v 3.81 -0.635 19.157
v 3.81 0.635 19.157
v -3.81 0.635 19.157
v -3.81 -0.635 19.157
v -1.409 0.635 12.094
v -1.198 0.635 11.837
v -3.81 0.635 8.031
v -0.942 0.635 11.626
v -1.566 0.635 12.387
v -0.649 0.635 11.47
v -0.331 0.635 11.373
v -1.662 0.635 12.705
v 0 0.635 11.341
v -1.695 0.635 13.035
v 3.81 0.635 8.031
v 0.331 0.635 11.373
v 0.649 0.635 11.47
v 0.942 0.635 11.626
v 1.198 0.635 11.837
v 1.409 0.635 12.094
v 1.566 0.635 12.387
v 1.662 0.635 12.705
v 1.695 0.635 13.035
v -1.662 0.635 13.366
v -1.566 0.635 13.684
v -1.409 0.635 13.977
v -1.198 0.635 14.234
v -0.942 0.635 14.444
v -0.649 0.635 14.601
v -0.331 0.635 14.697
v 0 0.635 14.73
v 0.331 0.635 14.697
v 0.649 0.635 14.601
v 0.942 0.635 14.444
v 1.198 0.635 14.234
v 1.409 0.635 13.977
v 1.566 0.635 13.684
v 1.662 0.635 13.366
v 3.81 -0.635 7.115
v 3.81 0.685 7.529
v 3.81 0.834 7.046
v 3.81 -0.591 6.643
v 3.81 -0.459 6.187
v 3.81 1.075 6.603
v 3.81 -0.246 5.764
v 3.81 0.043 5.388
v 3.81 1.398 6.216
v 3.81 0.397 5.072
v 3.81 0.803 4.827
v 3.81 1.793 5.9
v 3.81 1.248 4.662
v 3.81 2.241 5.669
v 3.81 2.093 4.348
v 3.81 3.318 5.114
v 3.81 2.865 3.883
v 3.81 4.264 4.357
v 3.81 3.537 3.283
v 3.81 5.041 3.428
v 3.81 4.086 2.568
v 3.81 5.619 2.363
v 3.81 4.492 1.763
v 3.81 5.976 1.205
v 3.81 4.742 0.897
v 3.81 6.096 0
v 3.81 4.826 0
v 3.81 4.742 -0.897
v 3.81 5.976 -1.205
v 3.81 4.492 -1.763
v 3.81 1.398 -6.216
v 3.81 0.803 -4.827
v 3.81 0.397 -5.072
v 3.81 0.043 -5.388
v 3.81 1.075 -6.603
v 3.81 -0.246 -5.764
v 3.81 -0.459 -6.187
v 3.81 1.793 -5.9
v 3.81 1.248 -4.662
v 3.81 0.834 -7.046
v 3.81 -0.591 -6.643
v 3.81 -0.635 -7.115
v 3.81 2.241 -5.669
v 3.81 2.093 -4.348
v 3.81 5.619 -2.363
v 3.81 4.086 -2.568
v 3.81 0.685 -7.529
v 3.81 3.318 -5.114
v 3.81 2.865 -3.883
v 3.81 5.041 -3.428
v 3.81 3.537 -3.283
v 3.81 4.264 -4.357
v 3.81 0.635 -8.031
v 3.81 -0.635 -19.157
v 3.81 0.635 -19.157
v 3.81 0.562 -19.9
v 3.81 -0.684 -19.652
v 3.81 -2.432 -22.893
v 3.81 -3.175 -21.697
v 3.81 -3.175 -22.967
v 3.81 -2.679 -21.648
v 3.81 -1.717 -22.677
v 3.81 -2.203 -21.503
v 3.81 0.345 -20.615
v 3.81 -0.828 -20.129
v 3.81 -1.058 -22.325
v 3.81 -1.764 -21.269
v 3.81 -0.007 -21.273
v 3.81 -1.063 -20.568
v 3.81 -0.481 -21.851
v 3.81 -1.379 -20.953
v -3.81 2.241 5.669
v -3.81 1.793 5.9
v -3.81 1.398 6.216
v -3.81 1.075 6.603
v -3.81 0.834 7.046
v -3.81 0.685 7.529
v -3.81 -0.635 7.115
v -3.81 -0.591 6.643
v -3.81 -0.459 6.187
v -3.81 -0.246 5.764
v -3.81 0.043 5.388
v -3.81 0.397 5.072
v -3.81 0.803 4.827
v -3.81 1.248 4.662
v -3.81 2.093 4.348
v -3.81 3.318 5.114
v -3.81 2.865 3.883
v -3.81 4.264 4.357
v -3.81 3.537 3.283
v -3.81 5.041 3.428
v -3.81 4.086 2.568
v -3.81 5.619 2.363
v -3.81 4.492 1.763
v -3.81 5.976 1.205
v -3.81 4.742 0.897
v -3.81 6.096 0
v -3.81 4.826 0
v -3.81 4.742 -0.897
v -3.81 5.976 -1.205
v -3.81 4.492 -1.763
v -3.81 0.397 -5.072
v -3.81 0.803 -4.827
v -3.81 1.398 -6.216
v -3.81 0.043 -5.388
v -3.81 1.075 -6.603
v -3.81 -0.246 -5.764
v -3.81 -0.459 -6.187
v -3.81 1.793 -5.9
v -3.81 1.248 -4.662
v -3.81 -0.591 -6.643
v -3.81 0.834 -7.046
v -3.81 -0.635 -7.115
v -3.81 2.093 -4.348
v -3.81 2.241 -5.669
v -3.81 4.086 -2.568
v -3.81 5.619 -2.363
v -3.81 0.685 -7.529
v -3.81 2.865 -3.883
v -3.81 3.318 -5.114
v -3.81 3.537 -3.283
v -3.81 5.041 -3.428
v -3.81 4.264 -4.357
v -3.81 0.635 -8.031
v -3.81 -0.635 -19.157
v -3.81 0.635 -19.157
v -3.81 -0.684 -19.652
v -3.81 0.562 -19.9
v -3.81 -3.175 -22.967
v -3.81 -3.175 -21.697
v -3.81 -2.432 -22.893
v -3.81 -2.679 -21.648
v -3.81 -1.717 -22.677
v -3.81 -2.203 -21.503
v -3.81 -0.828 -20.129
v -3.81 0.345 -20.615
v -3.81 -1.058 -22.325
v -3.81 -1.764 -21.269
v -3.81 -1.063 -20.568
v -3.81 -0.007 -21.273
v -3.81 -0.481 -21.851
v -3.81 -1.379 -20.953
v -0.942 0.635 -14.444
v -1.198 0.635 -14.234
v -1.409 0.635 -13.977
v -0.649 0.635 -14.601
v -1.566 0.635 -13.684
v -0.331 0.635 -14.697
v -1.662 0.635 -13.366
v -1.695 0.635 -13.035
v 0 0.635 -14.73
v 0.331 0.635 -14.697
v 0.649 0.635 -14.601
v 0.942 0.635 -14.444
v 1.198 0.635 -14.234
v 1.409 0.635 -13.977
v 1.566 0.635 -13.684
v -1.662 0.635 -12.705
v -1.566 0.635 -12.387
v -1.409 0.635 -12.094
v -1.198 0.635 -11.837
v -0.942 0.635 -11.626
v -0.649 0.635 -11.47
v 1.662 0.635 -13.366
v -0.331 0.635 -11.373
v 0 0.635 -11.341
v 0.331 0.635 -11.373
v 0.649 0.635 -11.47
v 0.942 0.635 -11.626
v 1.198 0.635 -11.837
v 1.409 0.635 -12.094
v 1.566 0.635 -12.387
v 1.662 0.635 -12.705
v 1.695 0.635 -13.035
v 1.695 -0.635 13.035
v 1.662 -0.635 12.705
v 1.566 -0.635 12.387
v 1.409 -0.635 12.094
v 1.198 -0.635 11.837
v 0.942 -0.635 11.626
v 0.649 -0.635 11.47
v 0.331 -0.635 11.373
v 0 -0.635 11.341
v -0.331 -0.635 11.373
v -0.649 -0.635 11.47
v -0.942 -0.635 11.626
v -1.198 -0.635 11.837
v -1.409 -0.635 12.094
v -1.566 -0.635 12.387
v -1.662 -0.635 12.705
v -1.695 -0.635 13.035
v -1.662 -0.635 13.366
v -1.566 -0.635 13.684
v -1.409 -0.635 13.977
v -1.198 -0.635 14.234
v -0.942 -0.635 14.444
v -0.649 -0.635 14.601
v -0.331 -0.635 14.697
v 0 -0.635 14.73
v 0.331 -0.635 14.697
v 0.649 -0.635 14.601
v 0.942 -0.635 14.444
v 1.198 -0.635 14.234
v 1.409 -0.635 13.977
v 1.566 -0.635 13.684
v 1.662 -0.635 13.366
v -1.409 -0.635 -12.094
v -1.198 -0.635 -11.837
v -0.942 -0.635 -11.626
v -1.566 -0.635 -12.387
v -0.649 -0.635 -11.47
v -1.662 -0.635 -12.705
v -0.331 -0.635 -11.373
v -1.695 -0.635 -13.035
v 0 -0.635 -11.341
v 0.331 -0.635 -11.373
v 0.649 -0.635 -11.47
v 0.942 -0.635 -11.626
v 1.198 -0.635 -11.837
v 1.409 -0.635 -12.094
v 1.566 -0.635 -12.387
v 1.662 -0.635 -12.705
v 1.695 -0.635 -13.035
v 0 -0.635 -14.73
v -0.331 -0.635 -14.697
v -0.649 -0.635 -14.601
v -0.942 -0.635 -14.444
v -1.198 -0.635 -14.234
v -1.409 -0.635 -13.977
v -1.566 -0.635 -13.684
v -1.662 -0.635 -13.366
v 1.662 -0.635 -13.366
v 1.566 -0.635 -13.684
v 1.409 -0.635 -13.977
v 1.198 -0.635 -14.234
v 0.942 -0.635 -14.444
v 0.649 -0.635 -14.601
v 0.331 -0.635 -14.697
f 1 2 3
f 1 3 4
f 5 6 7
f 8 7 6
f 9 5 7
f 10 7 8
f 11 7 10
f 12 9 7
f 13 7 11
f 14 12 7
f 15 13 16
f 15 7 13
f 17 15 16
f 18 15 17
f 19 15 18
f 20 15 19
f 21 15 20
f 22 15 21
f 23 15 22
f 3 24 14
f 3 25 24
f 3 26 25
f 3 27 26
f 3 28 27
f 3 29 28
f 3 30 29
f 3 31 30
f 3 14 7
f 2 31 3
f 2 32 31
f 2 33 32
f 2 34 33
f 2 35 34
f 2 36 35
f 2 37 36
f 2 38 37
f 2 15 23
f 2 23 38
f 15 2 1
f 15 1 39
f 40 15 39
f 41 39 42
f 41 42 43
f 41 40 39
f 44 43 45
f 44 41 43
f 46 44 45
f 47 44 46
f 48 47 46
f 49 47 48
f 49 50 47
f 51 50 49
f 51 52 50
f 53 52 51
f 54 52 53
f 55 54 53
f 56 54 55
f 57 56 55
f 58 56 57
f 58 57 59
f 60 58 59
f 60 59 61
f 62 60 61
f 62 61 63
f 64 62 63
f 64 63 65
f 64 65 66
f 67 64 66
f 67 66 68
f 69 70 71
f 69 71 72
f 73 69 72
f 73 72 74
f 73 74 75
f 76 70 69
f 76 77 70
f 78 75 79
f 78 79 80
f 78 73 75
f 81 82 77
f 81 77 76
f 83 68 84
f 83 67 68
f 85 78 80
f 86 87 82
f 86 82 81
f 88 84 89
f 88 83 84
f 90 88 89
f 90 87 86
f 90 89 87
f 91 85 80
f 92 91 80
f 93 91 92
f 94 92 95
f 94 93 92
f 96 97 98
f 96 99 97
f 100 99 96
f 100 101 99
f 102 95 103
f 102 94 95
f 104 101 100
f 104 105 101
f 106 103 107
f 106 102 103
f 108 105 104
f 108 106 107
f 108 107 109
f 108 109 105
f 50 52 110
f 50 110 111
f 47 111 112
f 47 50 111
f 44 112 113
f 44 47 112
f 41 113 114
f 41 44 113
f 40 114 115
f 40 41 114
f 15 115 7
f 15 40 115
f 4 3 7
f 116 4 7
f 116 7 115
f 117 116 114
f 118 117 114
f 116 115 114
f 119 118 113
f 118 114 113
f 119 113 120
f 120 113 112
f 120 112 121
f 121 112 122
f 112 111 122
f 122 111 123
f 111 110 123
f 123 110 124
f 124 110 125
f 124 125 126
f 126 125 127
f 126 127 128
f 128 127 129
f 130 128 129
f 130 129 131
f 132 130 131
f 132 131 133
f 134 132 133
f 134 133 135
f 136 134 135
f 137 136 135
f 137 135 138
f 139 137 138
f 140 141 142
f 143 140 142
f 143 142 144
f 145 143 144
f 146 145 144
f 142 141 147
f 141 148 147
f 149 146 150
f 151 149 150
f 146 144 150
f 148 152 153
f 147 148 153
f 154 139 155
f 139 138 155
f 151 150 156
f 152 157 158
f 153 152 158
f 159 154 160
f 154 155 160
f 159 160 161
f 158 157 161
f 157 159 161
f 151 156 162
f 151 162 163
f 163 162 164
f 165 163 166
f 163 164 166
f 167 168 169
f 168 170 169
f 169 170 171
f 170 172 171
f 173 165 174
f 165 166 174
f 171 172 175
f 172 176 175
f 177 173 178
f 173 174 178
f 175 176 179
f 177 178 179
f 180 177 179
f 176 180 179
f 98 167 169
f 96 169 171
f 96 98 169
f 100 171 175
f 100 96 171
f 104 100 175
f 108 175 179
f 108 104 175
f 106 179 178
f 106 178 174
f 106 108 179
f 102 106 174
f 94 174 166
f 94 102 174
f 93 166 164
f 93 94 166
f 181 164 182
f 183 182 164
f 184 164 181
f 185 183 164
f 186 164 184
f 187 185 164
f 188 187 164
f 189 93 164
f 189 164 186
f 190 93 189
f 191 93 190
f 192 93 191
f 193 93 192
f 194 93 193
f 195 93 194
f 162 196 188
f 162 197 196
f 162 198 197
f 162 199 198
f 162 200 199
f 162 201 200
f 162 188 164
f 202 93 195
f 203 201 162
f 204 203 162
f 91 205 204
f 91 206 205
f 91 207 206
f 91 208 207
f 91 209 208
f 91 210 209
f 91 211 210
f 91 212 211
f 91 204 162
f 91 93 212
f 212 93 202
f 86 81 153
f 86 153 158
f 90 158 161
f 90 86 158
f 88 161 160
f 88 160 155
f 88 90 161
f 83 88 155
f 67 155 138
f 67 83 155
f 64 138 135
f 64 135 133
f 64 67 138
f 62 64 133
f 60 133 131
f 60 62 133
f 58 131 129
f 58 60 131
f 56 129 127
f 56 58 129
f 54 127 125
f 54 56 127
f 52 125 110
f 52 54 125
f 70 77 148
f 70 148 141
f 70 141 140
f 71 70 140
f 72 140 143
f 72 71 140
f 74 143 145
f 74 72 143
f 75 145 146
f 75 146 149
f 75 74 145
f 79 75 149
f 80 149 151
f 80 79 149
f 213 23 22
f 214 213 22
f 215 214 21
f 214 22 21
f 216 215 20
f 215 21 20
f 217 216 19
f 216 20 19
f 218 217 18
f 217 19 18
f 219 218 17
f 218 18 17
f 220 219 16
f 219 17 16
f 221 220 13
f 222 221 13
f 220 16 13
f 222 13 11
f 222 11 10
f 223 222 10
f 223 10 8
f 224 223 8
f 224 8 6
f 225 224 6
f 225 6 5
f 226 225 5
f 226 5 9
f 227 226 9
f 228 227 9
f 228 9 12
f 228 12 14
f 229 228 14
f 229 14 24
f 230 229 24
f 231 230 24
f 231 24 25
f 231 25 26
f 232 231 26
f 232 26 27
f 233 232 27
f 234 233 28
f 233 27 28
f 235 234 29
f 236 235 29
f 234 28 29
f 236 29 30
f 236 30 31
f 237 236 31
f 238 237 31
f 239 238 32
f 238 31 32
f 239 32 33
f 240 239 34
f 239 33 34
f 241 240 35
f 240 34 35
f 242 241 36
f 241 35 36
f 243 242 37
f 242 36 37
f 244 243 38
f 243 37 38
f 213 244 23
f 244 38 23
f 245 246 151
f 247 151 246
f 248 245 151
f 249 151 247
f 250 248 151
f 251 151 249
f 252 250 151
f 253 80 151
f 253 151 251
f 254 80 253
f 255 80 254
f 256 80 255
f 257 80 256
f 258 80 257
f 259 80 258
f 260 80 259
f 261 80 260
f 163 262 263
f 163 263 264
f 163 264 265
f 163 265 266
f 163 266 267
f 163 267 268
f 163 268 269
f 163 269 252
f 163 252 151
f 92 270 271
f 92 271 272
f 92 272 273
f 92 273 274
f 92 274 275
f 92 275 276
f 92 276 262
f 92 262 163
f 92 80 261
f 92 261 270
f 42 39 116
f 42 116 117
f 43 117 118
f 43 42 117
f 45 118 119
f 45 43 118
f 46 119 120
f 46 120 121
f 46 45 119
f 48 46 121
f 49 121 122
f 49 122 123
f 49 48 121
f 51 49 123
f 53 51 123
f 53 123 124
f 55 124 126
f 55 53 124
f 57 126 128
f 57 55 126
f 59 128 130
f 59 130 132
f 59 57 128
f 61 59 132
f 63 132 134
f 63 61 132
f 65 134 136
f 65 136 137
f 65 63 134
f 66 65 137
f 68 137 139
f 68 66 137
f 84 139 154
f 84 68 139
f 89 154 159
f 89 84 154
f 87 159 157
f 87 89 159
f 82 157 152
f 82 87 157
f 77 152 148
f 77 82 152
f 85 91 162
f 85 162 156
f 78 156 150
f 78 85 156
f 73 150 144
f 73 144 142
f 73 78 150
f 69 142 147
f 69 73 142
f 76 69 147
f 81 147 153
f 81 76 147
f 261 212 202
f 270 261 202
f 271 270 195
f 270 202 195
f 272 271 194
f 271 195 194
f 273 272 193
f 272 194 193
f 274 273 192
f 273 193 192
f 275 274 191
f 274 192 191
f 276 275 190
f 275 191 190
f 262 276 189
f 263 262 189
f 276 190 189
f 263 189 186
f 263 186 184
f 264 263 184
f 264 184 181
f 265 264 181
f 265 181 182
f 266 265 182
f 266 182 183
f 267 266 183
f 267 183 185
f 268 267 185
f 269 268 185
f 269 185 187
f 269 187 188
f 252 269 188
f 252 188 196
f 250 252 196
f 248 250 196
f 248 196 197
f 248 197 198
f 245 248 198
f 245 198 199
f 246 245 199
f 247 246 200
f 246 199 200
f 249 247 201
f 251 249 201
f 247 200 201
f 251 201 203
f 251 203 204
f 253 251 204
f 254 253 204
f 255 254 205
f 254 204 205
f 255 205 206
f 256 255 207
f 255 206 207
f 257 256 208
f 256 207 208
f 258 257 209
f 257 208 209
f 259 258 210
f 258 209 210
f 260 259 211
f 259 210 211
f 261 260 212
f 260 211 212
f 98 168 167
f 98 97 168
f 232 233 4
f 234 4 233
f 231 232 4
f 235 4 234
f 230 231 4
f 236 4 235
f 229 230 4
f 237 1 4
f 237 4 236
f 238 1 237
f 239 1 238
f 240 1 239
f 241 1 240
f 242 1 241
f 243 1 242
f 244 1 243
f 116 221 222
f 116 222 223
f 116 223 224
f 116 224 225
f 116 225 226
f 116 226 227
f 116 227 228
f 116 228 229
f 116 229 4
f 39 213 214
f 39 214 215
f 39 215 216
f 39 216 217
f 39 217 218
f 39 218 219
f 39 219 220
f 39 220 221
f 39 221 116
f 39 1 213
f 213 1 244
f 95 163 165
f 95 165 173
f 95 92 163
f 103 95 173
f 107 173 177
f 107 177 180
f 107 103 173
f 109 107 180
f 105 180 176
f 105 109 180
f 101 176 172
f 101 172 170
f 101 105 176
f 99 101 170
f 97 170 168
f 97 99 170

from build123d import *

# Parameters (mm, degrees)
BOSS_EXTRUDE1_DEPTH = 3.81
CUT_EXTRUDE1_REACH  = 5.81
SKETCH3_R           = 1.694754892


with BuildPart() as part:
    # Sketch2 → Boss-Extrude1 (new body, symmetric)
    with BuildSketch(Plane(origin=(0, 0, 0), x_dir=(0, 0, -1), z_dir=(1, 0, 0))):
        with BuildLine():
            Line((21.69668, -3.175), (22.96668, -3.175))
            ThreePointArc((22.96668, -3.175), (21.850756836, -0.480923164), (19.15668, 0.635))
            Line((19.15668, 0.635), (8.031181171, 0.635))
            ThreePointArc((8.031181171, 0.635), (6.602950056, 1.074581974), (5.669069062, 2.241176471))
            ThreePointArc((5.669069062, 2.241176471), (0, 6.096), (-5.669069062, 2.241176471))
            ThreePointArc((-5.669069062, 2.241176471), (-6.602950056, 1.074581974), (-8.031181171, 0.635))
            Line((-8.031181171, 0.635), (-19.15668, 0.635))
            Line((-19.15668, 0.635), (-19.15668, -0.635))
            Line((-19.15668, -0.635), (-7.115400973, -0.635))
            ThreePointArc((-7.115400973, -0.635), (-5.568940052, -0.109958714), (-4.66181443, 1.248103448))
            ThreePointArc((-4.66181443, 1.248103448), (0, 4.826), (4.66181443, 1.248103448))
            ThreePointArc((4.66181443, 1.248103448), (5.568940052, -0.109958714), (7.115400973, -0.635))
            Line((7.115400973, -0.635), (19.15668, -0.635))
            ThreePointArc((19.15668, -0.635), (20.952731224, -1.378948776), (21.69668, -3.175))
        make_face()
    extrude(amount=BOSS_EXTRUDE1_DEPTH, both=True)

    # Sketch3 → Cut-Extrude1 (cut, up to next)
    with BuildSketch(Plane(origin=(0, 0.635, 0), x_dir=(1, 0, 0), z_dir=(0, 1, 0)), mode=Mode.PRIVATE) as cut_extrude1_sk1:
        with Locations((0, 13.03528)):
            Circle(SKETCH3_R)
    cut_extrude1_tool1 = extrude(cut_extrude1_sk1.sketch, amount=-CUT_EXTRUDE1_REACH, mode=Mode.PRIVATE) & part.part
    add(cut_extrude1_tool1.solids().sort_by_distance((0, 0.635, -13.03528))[0], mode=Mode.SUBTRACT)
    # Sketch3 → Cut-Extrude1 (cut, up to next)
    with BuildSketch(Plane(origin=(0, 0.635, 0), x_dir=(1, 0, 0), z_dir=(0, 1, 0)), mode=Mode.PRIVATE) as cut_extrude1_sk2:
        with Locations((0, -13.03528)):
            Circle(SKETCH3_R)
    cut_extrude1_tool2 = extrude(cut_extrude1_sk2.sketch, amount=-CUT_EXTRUDE1_REACH, mode=Mode.PRIVATE) & part.part
    add(cut_extrude1_tool2.solids().sort_by_distance((0, 0.635, 13.03528))[0], mode=Mode.SUBTRACT)


solid = part.part
